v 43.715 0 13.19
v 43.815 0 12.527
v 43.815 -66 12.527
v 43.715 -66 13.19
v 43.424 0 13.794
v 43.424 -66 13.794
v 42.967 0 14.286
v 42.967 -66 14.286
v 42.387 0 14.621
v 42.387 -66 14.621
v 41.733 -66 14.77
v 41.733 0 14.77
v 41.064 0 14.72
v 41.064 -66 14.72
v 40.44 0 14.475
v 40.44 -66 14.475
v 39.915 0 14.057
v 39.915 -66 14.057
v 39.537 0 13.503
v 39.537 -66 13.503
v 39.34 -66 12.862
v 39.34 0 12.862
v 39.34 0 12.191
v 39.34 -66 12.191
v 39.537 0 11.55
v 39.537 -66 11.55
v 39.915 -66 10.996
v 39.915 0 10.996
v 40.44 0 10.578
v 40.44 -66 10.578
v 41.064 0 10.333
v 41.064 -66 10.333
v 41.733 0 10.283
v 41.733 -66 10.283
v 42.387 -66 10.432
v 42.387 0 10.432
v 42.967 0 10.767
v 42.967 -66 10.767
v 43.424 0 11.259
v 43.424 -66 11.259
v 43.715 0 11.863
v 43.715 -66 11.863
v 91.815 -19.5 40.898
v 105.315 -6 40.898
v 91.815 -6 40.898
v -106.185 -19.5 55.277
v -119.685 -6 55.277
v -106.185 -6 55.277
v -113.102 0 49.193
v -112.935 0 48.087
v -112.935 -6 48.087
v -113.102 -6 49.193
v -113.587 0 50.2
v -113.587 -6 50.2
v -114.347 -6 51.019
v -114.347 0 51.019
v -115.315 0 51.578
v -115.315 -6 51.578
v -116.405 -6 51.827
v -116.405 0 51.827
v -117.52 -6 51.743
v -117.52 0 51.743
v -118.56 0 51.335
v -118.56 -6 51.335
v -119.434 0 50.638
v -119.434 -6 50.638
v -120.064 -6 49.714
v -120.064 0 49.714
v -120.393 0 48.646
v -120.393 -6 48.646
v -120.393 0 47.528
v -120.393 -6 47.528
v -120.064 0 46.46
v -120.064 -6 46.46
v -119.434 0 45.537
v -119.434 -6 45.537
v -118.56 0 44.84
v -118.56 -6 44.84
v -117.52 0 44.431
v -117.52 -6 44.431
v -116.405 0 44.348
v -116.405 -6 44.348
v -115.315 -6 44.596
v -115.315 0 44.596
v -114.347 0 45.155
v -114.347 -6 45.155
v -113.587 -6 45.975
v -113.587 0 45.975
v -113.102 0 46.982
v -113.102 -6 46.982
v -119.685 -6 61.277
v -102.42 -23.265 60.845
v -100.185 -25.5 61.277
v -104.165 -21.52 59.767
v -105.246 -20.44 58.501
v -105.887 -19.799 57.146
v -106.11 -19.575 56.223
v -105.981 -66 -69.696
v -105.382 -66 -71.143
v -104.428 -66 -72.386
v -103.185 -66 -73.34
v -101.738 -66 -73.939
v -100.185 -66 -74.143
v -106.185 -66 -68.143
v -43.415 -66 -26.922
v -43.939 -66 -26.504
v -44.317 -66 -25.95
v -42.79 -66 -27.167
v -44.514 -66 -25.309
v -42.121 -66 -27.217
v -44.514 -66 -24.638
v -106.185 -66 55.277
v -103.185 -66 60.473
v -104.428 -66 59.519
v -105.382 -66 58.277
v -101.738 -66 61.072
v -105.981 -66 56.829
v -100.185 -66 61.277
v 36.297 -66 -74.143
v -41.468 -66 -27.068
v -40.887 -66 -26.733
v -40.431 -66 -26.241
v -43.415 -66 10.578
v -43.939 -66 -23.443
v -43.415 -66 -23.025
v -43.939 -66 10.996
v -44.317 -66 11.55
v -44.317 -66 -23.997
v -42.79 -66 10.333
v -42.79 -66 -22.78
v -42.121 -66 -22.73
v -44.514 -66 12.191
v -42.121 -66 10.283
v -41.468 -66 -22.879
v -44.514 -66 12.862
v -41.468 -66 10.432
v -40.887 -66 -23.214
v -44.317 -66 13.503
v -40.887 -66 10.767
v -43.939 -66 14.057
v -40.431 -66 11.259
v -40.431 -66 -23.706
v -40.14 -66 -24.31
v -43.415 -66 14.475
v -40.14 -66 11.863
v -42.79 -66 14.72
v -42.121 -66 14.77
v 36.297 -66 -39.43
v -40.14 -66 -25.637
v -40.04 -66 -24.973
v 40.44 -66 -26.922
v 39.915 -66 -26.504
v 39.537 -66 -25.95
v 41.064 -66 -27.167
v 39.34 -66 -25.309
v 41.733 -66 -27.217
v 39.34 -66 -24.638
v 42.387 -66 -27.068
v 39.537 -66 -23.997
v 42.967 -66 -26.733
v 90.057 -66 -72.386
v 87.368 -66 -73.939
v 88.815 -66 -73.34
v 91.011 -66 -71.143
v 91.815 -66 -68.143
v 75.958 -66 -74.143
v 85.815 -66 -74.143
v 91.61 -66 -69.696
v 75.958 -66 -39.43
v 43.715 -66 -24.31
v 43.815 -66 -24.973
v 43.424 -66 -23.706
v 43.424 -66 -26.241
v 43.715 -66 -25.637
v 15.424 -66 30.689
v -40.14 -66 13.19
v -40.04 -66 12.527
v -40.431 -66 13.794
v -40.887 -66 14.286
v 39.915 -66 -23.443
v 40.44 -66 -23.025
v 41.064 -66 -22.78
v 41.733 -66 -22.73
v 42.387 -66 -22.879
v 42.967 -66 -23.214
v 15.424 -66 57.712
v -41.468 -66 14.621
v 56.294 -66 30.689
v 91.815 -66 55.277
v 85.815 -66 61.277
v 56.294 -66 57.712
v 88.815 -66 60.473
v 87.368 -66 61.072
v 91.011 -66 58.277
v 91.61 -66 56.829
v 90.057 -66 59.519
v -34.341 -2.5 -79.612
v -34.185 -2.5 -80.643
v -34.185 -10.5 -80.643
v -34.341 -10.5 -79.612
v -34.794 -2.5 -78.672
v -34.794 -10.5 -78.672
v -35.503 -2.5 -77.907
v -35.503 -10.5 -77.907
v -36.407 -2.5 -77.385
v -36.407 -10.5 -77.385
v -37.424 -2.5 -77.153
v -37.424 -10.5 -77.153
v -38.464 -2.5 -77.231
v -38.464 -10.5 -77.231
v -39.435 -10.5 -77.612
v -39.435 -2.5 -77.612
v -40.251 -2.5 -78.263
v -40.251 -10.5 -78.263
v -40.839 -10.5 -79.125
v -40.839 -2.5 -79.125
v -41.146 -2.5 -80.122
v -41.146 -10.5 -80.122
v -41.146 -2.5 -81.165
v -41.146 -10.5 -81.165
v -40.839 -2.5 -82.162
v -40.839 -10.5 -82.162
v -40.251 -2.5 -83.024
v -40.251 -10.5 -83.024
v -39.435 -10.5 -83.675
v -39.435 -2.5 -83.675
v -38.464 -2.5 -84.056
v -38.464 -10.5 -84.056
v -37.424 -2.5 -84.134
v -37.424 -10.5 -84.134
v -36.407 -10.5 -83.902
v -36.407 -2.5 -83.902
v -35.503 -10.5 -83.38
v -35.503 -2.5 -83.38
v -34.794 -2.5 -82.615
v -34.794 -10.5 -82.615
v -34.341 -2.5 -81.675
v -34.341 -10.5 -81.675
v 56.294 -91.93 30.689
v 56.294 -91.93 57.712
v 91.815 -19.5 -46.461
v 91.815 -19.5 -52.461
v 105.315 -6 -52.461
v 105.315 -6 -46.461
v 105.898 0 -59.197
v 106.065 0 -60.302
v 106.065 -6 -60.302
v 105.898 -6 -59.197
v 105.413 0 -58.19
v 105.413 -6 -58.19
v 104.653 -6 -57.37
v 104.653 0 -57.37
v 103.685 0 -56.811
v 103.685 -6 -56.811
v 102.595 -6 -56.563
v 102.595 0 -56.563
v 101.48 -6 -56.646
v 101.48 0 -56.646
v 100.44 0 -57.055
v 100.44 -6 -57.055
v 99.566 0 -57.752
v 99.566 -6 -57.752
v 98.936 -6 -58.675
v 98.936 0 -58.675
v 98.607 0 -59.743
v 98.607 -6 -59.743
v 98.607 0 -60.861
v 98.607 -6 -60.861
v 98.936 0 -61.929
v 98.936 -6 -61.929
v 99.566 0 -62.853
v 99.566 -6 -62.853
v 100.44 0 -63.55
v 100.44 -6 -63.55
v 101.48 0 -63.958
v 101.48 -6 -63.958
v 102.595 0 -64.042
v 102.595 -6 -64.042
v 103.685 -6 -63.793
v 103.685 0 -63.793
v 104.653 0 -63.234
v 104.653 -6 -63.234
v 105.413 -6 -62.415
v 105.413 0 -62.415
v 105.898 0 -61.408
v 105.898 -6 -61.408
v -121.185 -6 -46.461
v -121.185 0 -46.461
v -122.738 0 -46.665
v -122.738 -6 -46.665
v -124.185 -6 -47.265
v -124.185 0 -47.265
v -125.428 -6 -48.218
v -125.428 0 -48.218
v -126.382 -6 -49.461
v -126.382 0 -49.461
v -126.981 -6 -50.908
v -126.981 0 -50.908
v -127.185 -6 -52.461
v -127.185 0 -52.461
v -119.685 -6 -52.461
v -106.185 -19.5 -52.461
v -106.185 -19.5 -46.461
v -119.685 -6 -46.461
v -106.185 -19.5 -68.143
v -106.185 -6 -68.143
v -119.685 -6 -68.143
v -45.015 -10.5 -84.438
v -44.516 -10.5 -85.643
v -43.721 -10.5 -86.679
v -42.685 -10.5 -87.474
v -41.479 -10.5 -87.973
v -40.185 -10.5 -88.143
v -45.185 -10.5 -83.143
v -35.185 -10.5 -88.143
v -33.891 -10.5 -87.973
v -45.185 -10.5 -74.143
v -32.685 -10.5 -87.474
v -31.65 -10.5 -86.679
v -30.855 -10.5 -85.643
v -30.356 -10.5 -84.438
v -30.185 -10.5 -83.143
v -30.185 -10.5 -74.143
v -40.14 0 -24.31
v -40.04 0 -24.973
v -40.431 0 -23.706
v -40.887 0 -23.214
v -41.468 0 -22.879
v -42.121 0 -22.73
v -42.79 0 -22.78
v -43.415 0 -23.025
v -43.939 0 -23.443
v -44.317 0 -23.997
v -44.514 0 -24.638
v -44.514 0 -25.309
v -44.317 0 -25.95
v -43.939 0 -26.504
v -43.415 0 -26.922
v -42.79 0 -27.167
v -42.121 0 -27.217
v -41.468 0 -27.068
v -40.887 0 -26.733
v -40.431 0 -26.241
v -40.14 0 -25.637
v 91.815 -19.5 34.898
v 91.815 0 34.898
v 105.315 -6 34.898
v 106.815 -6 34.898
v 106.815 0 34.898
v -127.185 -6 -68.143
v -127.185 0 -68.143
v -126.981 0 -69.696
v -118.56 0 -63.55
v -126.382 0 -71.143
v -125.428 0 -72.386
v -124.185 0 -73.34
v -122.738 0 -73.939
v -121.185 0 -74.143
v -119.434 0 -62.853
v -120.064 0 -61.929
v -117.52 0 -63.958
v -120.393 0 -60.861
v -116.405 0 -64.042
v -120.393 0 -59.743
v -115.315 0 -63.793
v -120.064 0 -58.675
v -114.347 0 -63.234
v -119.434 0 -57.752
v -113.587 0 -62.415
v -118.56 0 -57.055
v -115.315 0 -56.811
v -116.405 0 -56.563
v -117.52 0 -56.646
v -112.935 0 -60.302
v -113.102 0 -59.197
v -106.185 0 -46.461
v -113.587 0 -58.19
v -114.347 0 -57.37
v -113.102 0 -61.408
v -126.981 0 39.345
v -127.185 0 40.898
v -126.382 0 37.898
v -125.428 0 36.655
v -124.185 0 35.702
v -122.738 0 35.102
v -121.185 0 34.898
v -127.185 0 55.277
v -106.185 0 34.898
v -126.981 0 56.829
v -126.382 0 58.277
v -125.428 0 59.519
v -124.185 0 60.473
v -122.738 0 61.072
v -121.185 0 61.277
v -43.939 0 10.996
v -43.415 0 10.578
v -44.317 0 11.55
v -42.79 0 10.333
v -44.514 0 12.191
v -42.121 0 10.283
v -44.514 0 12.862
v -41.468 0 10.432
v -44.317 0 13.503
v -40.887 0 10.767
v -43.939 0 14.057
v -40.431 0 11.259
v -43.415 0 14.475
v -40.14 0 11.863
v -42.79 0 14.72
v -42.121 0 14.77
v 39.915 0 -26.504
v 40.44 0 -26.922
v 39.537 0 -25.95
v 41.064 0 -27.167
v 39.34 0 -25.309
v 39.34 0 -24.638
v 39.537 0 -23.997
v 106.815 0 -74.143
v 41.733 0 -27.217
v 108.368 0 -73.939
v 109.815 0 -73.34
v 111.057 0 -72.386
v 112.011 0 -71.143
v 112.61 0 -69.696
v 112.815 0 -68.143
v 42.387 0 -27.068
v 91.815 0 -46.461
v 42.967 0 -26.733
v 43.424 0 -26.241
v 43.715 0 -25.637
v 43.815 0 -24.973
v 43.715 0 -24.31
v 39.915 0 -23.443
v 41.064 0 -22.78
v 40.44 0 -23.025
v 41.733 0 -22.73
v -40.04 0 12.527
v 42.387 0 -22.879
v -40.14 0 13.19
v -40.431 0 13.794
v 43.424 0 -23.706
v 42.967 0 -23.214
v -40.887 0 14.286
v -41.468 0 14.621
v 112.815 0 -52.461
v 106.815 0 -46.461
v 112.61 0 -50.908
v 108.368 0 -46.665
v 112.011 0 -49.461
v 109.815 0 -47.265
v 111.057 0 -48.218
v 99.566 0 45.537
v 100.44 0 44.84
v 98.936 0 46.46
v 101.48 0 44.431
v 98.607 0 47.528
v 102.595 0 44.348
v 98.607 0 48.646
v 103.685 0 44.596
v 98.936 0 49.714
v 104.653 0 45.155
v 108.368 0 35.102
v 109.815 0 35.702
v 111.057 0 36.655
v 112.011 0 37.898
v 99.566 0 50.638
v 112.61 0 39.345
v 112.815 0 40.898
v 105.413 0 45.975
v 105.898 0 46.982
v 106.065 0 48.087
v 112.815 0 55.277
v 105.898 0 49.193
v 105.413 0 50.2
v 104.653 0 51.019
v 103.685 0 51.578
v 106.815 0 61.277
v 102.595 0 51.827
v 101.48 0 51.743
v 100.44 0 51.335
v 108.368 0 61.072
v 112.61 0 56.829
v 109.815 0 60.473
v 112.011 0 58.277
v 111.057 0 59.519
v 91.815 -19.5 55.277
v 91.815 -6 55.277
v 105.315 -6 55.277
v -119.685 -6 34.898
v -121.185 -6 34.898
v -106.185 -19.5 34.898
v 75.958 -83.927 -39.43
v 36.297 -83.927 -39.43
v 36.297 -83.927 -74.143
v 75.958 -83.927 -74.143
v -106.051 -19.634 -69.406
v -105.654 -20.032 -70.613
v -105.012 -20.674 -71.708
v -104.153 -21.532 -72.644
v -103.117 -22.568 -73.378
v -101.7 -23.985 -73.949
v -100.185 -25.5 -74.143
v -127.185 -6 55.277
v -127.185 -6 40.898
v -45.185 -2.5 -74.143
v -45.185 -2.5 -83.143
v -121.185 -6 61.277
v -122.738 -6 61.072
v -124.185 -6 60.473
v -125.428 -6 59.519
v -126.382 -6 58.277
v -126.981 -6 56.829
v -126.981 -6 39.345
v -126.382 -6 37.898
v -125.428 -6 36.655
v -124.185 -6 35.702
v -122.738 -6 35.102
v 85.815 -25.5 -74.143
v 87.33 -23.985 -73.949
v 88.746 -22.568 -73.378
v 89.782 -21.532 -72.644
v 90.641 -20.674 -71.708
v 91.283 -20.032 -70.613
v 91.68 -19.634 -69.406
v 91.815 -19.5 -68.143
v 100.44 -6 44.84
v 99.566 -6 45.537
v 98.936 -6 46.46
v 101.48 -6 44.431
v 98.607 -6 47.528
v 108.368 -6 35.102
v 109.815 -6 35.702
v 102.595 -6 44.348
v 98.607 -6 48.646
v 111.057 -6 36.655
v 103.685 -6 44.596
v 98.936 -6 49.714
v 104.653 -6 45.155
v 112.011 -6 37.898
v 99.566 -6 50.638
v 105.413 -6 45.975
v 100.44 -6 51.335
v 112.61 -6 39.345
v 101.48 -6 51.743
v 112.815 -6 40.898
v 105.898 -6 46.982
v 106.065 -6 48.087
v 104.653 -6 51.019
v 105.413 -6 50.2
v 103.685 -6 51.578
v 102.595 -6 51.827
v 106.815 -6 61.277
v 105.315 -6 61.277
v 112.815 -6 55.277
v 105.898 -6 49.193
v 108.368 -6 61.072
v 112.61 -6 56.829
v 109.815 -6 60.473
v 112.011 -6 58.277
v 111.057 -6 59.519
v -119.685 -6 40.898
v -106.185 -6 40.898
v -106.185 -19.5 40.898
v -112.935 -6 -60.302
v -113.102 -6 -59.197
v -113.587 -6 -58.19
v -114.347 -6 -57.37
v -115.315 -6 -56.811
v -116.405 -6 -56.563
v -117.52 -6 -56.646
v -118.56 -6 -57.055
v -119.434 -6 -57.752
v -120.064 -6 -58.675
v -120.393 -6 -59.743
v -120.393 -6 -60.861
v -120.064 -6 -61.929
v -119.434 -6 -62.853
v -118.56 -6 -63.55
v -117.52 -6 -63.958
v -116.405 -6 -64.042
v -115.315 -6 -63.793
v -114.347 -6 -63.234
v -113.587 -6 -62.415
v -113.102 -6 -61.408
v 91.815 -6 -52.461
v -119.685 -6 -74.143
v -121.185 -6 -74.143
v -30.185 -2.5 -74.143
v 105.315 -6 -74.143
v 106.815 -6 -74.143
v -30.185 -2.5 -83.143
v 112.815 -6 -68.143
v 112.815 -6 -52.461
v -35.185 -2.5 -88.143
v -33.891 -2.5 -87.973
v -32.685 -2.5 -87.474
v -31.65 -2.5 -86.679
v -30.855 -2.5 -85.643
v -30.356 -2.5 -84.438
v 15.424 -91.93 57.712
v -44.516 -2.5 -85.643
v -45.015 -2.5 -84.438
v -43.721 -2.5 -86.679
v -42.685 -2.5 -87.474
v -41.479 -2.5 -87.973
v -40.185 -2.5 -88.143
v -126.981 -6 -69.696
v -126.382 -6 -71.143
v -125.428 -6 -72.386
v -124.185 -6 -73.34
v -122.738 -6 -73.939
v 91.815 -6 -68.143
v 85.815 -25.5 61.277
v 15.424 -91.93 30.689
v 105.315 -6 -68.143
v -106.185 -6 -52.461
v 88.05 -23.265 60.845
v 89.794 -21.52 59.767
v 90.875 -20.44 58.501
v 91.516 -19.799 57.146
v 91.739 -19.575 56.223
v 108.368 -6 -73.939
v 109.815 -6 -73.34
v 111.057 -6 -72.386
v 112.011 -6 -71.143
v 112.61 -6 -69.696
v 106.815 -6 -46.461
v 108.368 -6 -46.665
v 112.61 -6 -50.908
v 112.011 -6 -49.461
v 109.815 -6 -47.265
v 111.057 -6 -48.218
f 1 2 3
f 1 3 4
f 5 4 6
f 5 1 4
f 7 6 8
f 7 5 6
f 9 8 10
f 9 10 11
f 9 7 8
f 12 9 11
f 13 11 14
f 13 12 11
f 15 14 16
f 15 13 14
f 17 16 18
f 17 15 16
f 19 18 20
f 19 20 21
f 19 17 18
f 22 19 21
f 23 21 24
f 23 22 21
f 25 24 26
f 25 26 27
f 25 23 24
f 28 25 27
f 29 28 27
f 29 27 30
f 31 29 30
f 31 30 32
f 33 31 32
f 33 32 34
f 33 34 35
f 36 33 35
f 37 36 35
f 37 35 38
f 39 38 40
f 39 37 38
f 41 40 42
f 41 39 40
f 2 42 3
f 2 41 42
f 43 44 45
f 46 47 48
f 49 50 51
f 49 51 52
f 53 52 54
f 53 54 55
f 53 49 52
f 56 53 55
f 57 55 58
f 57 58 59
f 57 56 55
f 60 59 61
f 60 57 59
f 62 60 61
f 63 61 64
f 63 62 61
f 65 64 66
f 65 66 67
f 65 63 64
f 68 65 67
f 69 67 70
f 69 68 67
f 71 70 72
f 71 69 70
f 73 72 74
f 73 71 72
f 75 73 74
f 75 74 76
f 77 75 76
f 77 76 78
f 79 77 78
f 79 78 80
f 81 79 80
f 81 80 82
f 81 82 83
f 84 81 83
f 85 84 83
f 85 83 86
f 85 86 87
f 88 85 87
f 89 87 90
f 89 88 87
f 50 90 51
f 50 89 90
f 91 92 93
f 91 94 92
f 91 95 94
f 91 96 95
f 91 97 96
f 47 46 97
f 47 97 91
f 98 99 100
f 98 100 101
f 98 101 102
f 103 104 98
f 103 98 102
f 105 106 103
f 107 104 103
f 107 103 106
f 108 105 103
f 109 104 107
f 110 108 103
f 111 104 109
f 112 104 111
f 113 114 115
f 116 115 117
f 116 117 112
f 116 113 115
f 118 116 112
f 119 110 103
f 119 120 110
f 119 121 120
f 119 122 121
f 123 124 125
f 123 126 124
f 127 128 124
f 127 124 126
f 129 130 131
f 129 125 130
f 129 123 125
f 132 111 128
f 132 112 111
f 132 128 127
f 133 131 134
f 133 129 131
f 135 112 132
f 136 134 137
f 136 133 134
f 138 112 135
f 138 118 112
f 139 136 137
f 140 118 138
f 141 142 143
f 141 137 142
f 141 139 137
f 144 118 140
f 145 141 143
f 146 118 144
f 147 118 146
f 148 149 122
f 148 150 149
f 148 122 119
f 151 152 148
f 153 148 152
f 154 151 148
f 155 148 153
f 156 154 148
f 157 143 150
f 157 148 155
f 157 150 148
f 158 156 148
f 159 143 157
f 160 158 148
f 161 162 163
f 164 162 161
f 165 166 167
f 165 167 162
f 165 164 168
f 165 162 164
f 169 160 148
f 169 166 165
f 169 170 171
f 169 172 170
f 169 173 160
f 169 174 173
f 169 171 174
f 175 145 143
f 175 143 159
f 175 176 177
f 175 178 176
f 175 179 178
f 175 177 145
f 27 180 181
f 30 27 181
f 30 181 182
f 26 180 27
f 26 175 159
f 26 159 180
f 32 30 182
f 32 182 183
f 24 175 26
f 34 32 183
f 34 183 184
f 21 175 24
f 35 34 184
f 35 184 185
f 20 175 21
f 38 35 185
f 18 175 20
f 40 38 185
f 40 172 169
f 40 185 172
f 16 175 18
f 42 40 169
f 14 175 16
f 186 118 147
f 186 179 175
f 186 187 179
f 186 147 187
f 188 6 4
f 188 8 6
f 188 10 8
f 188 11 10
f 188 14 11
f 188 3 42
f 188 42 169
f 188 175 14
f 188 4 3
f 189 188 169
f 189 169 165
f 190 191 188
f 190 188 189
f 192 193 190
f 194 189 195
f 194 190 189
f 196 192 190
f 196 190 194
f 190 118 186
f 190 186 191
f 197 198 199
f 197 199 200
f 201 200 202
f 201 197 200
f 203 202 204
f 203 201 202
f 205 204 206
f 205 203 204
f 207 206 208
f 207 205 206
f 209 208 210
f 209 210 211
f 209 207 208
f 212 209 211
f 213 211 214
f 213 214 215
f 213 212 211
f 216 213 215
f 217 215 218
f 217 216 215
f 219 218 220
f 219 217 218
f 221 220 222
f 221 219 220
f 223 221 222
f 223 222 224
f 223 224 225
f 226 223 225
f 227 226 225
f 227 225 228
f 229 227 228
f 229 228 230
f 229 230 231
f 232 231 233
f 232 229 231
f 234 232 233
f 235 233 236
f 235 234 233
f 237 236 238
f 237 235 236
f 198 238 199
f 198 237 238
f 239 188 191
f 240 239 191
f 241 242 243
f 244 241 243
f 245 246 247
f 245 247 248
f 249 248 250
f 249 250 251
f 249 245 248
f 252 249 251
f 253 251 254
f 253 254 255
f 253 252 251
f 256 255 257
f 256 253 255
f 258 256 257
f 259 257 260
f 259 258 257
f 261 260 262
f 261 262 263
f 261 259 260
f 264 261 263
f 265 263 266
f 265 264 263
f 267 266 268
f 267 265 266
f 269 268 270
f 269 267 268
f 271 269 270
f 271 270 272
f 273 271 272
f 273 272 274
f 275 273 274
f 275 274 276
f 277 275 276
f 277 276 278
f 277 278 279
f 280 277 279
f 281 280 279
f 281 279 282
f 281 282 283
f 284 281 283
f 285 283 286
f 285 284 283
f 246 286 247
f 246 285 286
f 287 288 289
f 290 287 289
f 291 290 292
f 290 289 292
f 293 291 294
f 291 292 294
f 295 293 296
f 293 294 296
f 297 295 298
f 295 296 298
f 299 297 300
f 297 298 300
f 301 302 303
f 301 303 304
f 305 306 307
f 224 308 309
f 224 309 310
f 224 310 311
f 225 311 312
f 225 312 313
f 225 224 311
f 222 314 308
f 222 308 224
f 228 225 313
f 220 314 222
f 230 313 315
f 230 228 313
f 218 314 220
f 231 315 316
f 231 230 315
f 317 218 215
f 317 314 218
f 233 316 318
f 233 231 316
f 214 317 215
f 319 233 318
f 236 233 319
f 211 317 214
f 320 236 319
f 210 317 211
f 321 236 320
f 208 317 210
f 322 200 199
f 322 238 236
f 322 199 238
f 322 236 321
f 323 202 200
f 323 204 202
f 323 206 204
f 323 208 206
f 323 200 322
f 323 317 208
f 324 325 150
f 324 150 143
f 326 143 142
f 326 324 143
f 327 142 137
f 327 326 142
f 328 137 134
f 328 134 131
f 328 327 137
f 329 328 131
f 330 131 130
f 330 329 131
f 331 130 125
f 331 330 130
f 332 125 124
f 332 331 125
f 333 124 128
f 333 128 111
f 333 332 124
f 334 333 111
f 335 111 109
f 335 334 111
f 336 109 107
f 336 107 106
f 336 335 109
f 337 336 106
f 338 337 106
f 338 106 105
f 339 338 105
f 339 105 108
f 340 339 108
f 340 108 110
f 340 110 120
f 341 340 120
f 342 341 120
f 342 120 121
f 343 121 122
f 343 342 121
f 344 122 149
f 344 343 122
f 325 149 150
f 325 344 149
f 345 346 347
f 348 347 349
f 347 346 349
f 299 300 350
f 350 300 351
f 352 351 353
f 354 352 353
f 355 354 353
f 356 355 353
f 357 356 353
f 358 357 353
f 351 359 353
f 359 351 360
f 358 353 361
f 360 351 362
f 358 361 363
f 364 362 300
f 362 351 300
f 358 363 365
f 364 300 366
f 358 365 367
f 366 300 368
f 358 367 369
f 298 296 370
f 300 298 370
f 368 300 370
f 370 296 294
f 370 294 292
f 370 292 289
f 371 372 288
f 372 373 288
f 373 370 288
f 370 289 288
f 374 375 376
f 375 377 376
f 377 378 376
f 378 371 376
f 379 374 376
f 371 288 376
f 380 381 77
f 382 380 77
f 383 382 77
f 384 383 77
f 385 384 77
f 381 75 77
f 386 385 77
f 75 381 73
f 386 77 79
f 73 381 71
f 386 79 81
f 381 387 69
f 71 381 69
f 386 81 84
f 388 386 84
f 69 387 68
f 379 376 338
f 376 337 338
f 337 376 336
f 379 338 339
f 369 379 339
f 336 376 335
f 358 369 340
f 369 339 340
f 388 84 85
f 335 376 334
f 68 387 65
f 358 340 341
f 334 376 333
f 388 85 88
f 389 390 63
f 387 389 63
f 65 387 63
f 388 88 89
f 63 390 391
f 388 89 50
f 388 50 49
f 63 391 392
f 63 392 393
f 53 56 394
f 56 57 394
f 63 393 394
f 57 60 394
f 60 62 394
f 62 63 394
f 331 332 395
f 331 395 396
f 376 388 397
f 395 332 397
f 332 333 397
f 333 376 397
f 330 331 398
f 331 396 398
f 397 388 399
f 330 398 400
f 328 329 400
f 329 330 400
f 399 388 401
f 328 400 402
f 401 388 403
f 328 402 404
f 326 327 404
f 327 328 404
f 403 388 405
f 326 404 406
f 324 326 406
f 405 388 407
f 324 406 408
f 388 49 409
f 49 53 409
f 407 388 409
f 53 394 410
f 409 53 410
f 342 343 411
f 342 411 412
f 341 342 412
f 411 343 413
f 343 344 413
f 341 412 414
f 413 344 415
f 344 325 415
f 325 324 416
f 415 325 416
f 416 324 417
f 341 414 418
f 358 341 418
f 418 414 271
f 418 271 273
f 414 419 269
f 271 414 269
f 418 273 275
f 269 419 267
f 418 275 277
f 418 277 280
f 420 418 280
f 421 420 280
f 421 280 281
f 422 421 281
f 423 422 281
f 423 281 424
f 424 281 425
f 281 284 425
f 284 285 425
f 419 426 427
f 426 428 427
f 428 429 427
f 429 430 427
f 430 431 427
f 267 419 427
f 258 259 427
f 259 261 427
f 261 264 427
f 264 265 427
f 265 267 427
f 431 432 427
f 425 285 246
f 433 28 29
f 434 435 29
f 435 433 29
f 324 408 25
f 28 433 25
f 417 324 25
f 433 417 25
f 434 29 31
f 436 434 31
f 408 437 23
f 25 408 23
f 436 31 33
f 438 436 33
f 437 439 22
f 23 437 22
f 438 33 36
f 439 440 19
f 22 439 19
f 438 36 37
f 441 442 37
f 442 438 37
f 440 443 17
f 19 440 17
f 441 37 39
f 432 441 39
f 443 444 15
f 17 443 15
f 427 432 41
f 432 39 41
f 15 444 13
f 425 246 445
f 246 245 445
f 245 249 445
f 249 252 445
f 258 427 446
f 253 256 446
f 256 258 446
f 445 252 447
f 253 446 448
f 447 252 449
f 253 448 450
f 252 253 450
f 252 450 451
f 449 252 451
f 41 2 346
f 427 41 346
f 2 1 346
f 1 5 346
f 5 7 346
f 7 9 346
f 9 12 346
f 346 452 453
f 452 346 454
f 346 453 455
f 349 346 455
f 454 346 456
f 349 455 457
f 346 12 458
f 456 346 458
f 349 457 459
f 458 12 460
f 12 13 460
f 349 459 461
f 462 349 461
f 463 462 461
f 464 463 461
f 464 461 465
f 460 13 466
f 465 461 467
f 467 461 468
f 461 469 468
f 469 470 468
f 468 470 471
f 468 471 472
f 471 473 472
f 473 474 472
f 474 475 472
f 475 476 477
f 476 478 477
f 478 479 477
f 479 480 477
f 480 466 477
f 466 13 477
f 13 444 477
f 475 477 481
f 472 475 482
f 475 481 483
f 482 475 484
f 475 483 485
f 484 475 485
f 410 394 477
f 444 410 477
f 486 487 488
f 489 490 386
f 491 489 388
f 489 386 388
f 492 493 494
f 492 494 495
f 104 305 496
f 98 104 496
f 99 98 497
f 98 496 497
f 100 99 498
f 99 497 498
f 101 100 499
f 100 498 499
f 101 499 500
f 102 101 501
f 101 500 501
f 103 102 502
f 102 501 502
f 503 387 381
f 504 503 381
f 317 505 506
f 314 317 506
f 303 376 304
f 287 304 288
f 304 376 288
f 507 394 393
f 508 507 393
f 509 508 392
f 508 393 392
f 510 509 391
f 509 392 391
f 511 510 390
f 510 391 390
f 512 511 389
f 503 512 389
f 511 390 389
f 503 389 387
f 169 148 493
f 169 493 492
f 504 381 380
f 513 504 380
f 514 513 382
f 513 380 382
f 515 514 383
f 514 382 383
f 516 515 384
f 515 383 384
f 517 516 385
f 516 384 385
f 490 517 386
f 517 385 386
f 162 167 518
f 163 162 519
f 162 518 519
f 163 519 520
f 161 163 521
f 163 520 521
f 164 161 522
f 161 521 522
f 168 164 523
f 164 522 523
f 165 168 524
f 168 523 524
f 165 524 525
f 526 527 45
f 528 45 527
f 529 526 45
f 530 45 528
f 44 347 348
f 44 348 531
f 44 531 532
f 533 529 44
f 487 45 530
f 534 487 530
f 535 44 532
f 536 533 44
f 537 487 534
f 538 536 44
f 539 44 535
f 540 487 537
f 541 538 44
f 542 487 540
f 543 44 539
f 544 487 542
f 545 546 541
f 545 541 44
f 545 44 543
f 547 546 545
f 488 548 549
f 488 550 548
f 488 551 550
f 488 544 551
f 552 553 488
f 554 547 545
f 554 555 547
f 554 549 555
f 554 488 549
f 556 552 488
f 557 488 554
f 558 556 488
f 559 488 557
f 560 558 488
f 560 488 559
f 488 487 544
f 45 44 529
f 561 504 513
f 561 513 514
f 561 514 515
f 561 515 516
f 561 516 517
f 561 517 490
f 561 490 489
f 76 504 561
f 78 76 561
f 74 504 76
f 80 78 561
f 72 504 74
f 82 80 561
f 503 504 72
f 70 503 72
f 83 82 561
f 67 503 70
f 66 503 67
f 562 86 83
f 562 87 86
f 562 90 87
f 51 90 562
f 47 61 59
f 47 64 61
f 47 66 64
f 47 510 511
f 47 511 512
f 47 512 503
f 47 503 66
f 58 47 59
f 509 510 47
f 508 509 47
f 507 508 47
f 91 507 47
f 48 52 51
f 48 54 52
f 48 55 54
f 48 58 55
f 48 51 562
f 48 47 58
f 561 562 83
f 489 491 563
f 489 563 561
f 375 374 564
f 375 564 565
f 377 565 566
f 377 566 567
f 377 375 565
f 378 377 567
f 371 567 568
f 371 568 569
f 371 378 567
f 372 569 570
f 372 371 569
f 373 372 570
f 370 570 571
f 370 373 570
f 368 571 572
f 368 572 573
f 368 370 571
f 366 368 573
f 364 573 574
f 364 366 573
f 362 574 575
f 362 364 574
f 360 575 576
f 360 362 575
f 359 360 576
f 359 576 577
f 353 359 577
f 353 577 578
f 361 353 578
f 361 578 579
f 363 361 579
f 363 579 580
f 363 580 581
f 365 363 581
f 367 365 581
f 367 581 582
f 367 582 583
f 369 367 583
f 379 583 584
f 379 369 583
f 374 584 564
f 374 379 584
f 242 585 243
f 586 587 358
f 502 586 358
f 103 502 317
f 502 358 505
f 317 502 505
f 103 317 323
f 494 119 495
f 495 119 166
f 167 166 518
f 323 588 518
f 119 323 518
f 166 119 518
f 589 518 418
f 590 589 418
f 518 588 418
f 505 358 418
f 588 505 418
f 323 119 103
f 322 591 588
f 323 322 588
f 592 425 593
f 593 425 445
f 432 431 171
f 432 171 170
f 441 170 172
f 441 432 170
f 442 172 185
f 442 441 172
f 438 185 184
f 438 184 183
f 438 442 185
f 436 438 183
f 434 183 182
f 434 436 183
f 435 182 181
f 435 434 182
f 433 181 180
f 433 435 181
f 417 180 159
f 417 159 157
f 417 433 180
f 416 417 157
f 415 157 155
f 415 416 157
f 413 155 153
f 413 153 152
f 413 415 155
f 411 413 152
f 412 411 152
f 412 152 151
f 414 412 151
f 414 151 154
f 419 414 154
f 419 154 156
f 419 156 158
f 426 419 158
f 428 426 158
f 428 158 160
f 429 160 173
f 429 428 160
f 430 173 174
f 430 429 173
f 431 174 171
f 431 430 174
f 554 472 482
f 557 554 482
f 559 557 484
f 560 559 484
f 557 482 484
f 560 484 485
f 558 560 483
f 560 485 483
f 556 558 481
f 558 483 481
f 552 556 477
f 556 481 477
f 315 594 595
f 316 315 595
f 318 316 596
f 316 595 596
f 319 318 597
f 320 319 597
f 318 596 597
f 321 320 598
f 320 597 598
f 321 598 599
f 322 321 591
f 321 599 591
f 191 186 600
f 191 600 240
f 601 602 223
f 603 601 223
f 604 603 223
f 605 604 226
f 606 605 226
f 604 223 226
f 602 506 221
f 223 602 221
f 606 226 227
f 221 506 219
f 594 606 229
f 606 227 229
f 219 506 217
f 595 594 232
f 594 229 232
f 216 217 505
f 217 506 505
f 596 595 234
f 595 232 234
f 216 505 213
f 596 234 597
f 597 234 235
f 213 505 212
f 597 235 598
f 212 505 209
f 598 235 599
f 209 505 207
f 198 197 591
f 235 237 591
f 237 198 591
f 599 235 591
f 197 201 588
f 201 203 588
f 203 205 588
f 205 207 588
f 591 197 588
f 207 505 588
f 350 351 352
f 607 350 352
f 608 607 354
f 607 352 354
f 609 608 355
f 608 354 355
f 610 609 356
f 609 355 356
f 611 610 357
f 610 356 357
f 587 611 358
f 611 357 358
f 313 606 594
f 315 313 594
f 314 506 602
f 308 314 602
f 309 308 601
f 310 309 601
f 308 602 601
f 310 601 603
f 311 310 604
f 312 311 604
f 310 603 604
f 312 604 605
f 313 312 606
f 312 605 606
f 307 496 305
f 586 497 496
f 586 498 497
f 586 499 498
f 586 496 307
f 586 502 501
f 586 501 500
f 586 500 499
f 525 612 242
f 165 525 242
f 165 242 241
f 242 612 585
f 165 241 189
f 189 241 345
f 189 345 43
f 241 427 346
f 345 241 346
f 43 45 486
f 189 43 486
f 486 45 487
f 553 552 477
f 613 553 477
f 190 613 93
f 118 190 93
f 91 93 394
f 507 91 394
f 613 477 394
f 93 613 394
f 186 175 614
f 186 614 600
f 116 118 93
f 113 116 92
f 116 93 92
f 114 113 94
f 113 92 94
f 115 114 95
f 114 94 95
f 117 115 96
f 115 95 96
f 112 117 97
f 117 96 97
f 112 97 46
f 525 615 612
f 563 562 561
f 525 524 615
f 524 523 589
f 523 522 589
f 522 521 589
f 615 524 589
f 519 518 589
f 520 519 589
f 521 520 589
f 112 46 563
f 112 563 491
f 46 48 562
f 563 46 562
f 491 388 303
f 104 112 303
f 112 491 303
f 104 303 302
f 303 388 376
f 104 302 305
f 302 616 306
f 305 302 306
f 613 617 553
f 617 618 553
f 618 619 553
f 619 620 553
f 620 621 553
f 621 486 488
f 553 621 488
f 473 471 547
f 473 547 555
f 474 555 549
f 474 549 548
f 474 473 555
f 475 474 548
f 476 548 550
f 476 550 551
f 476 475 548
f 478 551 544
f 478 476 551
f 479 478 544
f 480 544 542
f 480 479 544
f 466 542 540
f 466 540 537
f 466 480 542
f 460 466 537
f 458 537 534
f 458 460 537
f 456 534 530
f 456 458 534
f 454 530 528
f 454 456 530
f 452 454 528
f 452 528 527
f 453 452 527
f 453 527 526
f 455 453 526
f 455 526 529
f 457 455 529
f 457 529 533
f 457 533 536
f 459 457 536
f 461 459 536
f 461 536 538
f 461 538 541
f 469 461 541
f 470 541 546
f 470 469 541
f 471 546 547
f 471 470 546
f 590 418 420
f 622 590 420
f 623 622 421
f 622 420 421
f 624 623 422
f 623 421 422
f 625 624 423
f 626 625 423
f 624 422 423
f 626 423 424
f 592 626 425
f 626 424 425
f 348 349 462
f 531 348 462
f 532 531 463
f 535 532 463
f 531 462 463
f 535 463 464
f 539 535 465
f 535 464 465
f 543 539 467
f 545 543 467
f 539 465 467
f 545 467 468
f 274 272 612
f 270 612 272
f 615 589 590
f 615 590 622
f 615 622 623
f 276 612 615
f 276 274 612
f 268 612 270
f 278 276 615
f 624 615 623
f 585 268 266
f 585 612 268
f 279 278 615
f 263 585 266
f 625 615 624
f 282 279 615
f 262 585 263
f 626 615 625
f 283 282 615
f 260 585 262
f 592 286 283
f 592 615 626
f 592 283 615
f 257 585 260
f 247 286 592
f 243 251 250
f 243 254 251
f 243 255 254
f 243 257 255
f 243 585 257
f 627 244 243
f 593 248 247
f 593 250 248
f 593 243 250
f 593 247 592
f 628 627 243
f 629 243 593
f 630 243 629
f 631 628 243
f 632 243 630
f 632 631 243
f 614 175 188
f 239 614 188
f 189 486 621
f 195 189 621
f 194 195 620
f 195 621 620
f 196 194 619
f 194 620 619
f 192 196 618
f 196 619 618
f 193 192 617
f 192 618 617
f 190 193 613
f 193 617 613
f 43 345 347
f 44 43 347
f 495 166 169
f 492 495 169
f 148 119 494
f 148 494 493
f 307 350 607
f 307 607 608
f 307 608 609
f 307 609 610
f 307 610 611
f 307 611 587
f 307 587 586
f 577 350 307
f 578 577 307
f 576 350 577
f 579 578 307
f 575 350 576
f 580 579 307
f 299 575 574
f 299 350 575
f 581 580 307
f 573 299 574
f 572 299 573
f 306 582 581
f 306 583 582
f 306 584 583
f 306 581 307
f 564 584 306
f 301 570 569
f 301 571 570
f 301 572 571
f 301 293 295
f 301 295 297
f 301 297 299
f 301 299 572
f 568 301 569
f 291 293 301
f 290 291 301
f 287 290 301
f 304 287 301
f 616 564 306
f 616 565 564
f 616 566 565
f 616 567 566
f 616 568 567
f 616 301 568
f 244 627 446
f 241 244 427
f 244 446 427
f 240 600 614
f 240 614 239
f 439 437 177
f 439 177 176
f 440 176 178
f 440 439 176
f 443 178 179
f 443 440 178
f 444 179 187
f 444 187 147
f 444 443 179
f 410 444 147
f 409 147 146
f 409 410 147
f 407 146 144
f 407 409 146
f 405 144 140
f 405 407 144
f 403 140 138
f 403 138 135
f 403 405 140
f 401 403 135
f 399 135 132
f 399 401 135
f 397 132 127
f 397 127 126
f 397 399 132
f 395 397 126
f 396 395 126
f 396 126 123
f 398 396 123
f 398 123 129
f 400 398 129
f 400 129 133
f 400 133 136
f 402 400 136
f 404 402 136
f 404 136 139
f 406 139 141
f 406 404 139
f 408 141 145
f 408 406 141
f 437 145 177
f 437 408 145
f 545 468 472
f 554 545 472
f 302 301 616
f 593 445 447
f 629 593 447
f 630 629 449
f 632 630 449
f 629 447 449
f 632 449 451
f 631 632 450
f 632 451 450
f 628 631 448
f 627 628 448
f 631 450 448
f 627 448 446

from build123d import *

# Parameters (mm, degrees)
F0_R      = 2.25
F1_DEPTH  = 66
F0_R_2    = 3.75
F2_DEPTH  = 6
F5_W      = 40.8705817536
F5_H      = 27.0229801536
F6_DEPTH  = 25.93
F5_W_2    = 39.6605432034
F5_H_2    = 34.7132187133
F7_DEPTH  = 17.926812
F8_REACH  = 45.9022057631
F9_REACH  = 45.9022057631
F10_START = 2.5
F0_R_3    = 3.5
F10_DEPTH = 8


with BuildPart() as f1:
    # F0 (on Front) → F1 (new body)
    with BuildSketch(Plane.XZ):
        with BuildLine():
            Line((85.8146208827, 61.2765278835), (-100.1853791173, 61.2765278835))
            ThreePointArc((-100.1853791173, 61.2765278835), (-104.4280198044, 59.5191685706), (-106.1853791173, 55.2765278835))
            Line((-106.1853791173, 55.2765278835), (-106.1853791173, 40.8978178835))
            Line((-106.1853791173, 40.8978178835), (-106.1853791173, 34.8978178835))
            Line((-106.1853791173, 34.8978178835), (-106.1853791173, -46.4609452256))
            Line((-106.1853791173, -46.4609452256), (-106.1853791173, -52.4609452256))
            Line((-106.1853791173, -52.4609452256), (-106.1853791173, -68.1434721165))
            ThreePointArc((-106.1853791173, -68.1434721165), (-104.4280198044, -72.3861128036), (-100.1853791173, -74.1434721165))
            Line((-100.1853791173, -74.1434721165), (-45.1853791173, -74.1434721165))
            Line((-45.1853791173, -74.1434721165), (-30.1853791173, -74.1434721165))
            Line((-30.1853791173, -74.1434721165), (85.8146208827, -74.1434721165))
            ThreePointArc((85.8146208827, -74.1434721165), (90.0572615698, -72.3861128036), (91.8146208827, -68.1434721165))
            Line((91.8146208827, -68.1434721165), (91.8146208827, -52.4609452256))
            Line((91.8146208827, -52.4609452256), (91.8146208827, -46.4609452256))
            Line((91.8146208827, -46.4609452256), (91.8146208827, 34.8978178835))
            Line((91.8146208827, 34.8978178835), (91.8146208827, 40.8978178835))
            Line((91.8146208827, 40.8978178835), (91.8146208827, 55.2765278835))
            ThreePointArc((91.8146208827, 55.2765278835), (90.0572615698, 59.5191685706), (85.8146208827, 61.2765278835))
        make_face()
        with Locations((-42.2896091173, -24.9734721165)):
            Circle(F0_R, mode=Mode.SUBTRACT)
        with Locations((41.5646208827, -24.9734721165)):
            Circle(F0_R, mode=Mode.SUBTRACT)
        with Locations((-42.2896091173, 12.5265278835)):
            Circle(F0_R, mode=Mode.SUBTRACT)
        with Locations((41.5646208827, 12.5265278835)):
            Circle(F0_R, mode=Mode.SUBTRACT)
    extrude(amount=F1_DEPTH)

    # F0 (on Front) → F2 (join)
    with BuildSketch(Plane.XZ):
        with BuildLine():
            Line((-106.1853791173, 40.8978178835), (-106.1853791173, 55.2765278835))
            Line((-106.1853791173, 55.2765278835), (-119.6853791173, 55.2765278835))
            Line((-119.6853791173, 55.2765278835), (-119.6853791173, 61.2765278835))
            Line((-119.6853791173, 61.2765278835), (-121.1853791173, 61.2765278835))
            ThreePointArc((-121.1853791173, 61.2765278835), (-125.4280198044, 59.5191685706), (-127.1853791173, 55.2765278835))
            Line((-127.1853791173, 55.2765278835), (-127.1853791173, 40.8978178835))
            ThreePointArc((-127.1853791173, 40.8978178835), (-125.4280198044, 36.6551771964), (-121.1853791173, 34.8978178835))
            Line((-121.1853791173, 34.8978178835), (-119.6853791173, 34.8978178835))
            Line((-119.6853791173, 34.8978178835), (-119.6853791173, 40.8978178835))
            Line((-119.6853791173, 40.8978178835), (-106.1853791173, 40.8978178835))
        make_face()
        with Locations((-116.6853791173, 48.0871728835)):
            Circle(F0_R_2, mode=Mode.SUBTRACT)
        with BuildLine():
            Line((106.8146208827, 61.2765278835), (105.3146208827, 61.2765278835))
            Line((105.3146208827, 61.2765278835), (105.3146208827, 55.2765278835))
            Line((105.3146208827, 55.2765278835), (91.8146208827, 55.2765278835))
            Line((91.8146208827, 55.2765278835), (91.8146208827, 40.8978178835))
            Line((91.8146208827, 40.8978178835), (105.3146208827, 40.8978178835))
            Line((105.3146208827, 40.8978178835), (105.3146208827, 34.8978178835))
            Line((105.3146208827, 34.8978178835), (106.8146208827, 34.8978178835))
            ThreePointArc((106.8146208827, 34.8978178835), (111.0572615698, 36.6551771964), (112.8146208827, 40.8978178835))
            Line((112.8146208827, 40.8978178835), (112.8146208827, 55.2765278835))
            ThreePointArc((112.8146208827, 55.2765278835), (111.0572615698, 59.5191685706), (106.8146208827, 61.2765278835))
        make_face()
        with Locations((102.3146208827, 48.0871728835)):
            Circle(F0_R_2, mode=Mode.SUBTRACT)
        with BuildLine():
            Line((105.3146208827, -52.4609452256), (91.8146208827, -52.4609452256))
            Line((91.8146208827, -52.4609452256), (91.8146208827, -68.1434721165))
            Line((91.8146208827, -68.1434721165), (105.3146208827, -68.1434721165))
            Line((105.3146208827, -68.1434721165), (105.3146208827, -74.1434721165))
            Line((105.3146208827, -74.1434721165), (106.8146208827, -74.1434721165))
            ThreePointArc((106.8146208827, -74.1434721165), (111.0572615698, -72.3861128036), (112.8146208827, -68.1434721165))
            Line((112.8146208827, -68.1434721165), (112.8146208827, -52.4609452256))
            ThreePointArc((112.8146208827, -52.4609452256), (111.0572615698, -48.2183045385), (106.8146208827, -46.4609452256))
            Line((106.8146208827, -46.4609452256), (105.3146208827, -46.4609452256))
            Line((105.3146208827, -46.4609452256), (105.3146208827, -52.4609452256))
        make_face()
        with Locations((102.3146208827, -60.302208671)):
            Circle(F0_R_2, mode=Mode.SUBTRACT)
        with BuildLine():
            Line((-106.1853791173, -68.1434721165), (-106.1853791173, -52.4609452256))
            Line((-106.1853791173, -52.4609452256), (-119.6853791173, -52.4609452256))
            Line((-119.6853791173, -52.4609452256), (-119.6853791173, -46.4609452256))
            Line((-119.6853791173, -46.4609452256), (-121.1853791173, -46.4609452256))
            ThreePointArc((-121.1853791173, -46.4609452256), (-125.4280198044, -48.2183045385), (-127.1853791173, -52.4609452256))
            Line((-127.1853791173, -52.4609452256), (-127.1853791173, -68.1434721165))
            ThreePointArc((-127.1853791173, -68.1434721165), (-125.4280198044, -72.3861128036), (-121.1853791173, -74.1434721165))
            Line((-121.1853791173, -74.1434721165), (-119.6853791173, -74.1434721165))
            Line((-119.6853791173, -74.1434721165), (-119.6853791173, -68.1434721165))
            Line((-119.6853791173, -68.1434721165), (-106.1853791173, -68.1434721165))
        make_face()
        with Locations((-116.6853791173, -60.302208671)):
            Circle(F0_R_2, mode=Mode.SUBTRACT)
        with BuildLine():
            ThreePointArc((-106.1853791173, 55.2765278835), (-104.4280198044, 59.5191685706), (-100.1853791173, 61.2765278835))
            Line((-100.1853791173, 61.2765278835), (-106.1853791173, 61.2765278835))
            Line((-106.1853791173, 61.2765278835), (-119.6853791173, 61.2765278835))
            Line((-119.6853791173, 61.2765278835), (-119.6853791173, 55.2765278835))
            Line((-119.6853791173, 55.2765278835), (-106.1853791173, 55.2765278835))
        make_face()
        Polygon((-106.1853791173, 34.8978178835), (-106.1853791173, 40.8978178835), (-119.6853791173, 40.8978178835), (-119.6853791173, 34.8978178835), (-112.1853791173, 34.8978178835), align=None)
        Polygon((-106.1853791173, -52.4609452256), (-106.1853791173, -46.4609452256), (-112.1853791173, -46.4609452256), (-119.6853791173, -46.4609452256), (-119.6853791173, -52.4609452256), align=None)
        with BuildLine():
            ThreePointArc((-100.1853791173, -74.1434721165), (-104.4280198044, -72.3861128036), (-106.1853791173, -68.1434721165))
            Line((-106.1853791173, -68.1434721165), (-119.6853791173, -68.1434721165))
            Line((-119.6853791173, -68.1434721165), (-119.6853791173, -74.1434721165))
            Line((-119.6853791173, -74.1434721165), (-100.1853791173, -74.1434721165))
        make_face()
        with BuildLine():
            Line((105.3146208827, -68.1434721165), (91.8146208827, -68.1434721165))
            ThreePointArc((91.8146208827, -68.1434721165), (90.0572615698, -72.3861128036), (85.8146208827, -74.1434721165))
            Line((85.8146208827, -74.1434721165), (105.3146208827, -74.1434721165))
            Line((105.3146208827, -74.1434721165), (105.3146208827, -68.1434721165))
        make_face()
        Polygon((97.8146208827, -46.4609452256), (91.8146208827, -46.4609452256), (91.8146208827, -52.4609452256), (105.3146208827, -52.4609452256), (105.3146208827, -46.4609452256), align=None)
        Polygon((105.3146208827, 40.8978178835), (91.8146208827, 40.8978178835), (91.8146208827, 34.8978178835), (97.8146208827, 34.8978178835), (105.3146208827, 34.8978178835), align=None)
        with BuildLine():
            Line((105.3146208827, 61.2765278835), (85.8146208827, 61.2765278835))
            ThreePointArc((85.8146208827, 61.2765278835), (90.0572615698, 59.5191685706), (91.8146208827, 55.2765278835))
            Line((91.8146208827, 55.2765278835), (105.3146208827, 55.2765278835))
            Line((105.3146208827, 55.2765278835), (105.3146208827, 61.2765278835))
        make_face()
    extrude(amount=F2_DEPTH)

    # F5 (on face) → F6 (join)
    with BuildSketch(Plane.XZ.offset(66)):
        with Locations((35.8588262461, 44.2000478506)):
            Rectangle(F5_W, F5_H)
    extrude(amount=F6_DEPTH)

    # F5 (on face) → F7 (join)
    with BuildSketch(Plane.XZ.offset(66)):
        with Locations((56.1274141073, -56.7868627598)):
            Rectangle(F5_W_2, F5_H_2)
    extrude(amount=F7_DEPTH)

    f8_end = Plane(origin=(-109.9353791173, -15.75, -4.1434721165), x_dir=(-0.7071067812, 0.7071067812, 0), z_dir=(-0.7071067812, -0.7071067812, 0))
    # F0 (on Front) → F8 (join, up to a plane its end follows)
    with BuildSketch(Plane.XZ):
        with BuildLine():
            ThreePointArc((-106.1853791173, 55.2765278835), (-104.4280198044, 59.5191685706), (-100.1853791173, 61.2765278835))
            Line((-100.1853791173, 61.2765278835), (-106.1853791173, 61.2765278835))
            Line((-106.1853791173, 61.2765278835), (-119.6853791173, 61.2765278835))
            Line((-119.6853791173, 61.2765278835), (-119.6853791173, 55.2765278835))
            Line((-119.6853791173, 55.2765278835), (-106.1853791173, 55.2765278835))
        make_face()
        Polygon((-106.1853791173, 34.8978178835), (-106.1853791173, 40.8978178835), (-119.6853791173, 40.8978178835), (-119.6853791173, 34.8978178835), (-112.1853791173, 34.8978178835), align=None)
        Polygon((-106.1853791173, -52.4609452256), (-106.1853791173, -46.4609452256), (-112.1853791173, -46.4609452256), (-119.6853791173, -46.4609452256), (-119.6853791173, -52.4609452256), align=None)
        with BuildLine():
            ThreePointArc((-100.1853791173, -74.1434721165), (-104.4280198044, -72.3861128036), (-106.1853791173, -68.1434721165))
            Line((-106.1853791173, -68.1434721165), (-119.6853791173, -68.1434721165))
            Line((-119.6853791173, -68.1434721165), (-119.6853791173, -74.1434721165))
            Line((-119.6853791173, -74.1434721165), (-100.1853791173, -74.1434721165))
        make_face()
    f8_long = extrude(amount=F8_REACH, mode=Mode.PRIVATE)
    add(split(f8_long, bisect_by=f8_end, keep=Keep.BOTTOM, mode=Mode.PRIVATE))

    f9_end = Plane(origin=(95.5646208827, -15.75, -4.1434721165), x_dir=(0.7071067812, 0.7071067812, 0), z_dir=(-0.7071067812, 0.7071067812, 0))
    # F0 (on Front) → F9 (join, up to a plane its end follows)
    with BuildSketch(Plane.XZ):
        with BuildLine():
            Line((105.3146208827, 61.2765278835), (85.8146208827, 61.2765278835))
            ThreePointArc((85.8146208827, 61.2765278835), (90.0572615698, 59.5191685706), (91.8146208827, 55.2765278835))
            Line((91.8146208827, 55.2765278835), (105.3146208827, 55.2765278835))
            Line((105.3146208827, 55.2765278835), (105.3146208827, 61.2765278835))
        make_face()
        Polygon((105.3146208827, 40.8978178835), (91.8146208827, 40.8978178835), (91.8146208827, 34.8978178835), (97.8146208827, 34.8978178835), (105.3146208827, 34.8978178835), align=None)
        Polygon((97.8146208827, -46.4609452256), (91.8146208827, -46.4609452256), (91.8146208827, -52.4609452256), (105.3146208827, -52.4609452256), (105.3146208827, -46.4609452256), align=None)
        with BuildLine():
            Line((105.3146208827, -68.1434721165), (91.8146208827, -68.1434721165))
            ThreePointArc((91.8146208827, -68.1434721165), (90.0572615698, -72.3861128036), (85.8146208827, -74.1434721165))
            Line((85.8146208827, -74.1434721165), (105.3146208827, -74.1434721165))
            Line((105.3146208827, -74.1434721165), (105.3146208827, -68.1434721165))
        make_face()
    f9_long = extrude(amount=F9_REACH, mode=Mode.PRIVATE)
    add(split(f9_long, bisect_by=f9_end, keep=Keep.TOP, mode=Mode.PRIVATE))

    # F0 (on Front) → F10 (join)
    with BuildSketch(Plane.XZ.offset(F10_START)):
        with BuildLine():
            Line((-30.1853791173, -74.1434721165), (-45.1853791173, -74.1434721165))
            Line((-45.1853791173, -74.1434721165), (-45.1853791173, -83.1434721165))
            ThreePointArc((-45.1853791173, -83.1434721165), (-43.7209130232, -86.6790060224), (-40.1853791173, -88.1434721165))
            Line((-40.1853791173, -88.1434721165), (-35.1853791173, -88.1434721165))
            ThreePointArc((-35.1853791173, -88.1434721165), (-31.6498452114, -86.6790060224), (-30.1853791173, -83.1434721165))
            Line((-30.1853791173, -83.1434721165), (-30.1853791173, -74.1434721165))
        make_face()
        with Locations((-37.6853791173, -80.6434721165)):
            Circle(F0_R_3, mode=Mode.SUBTRACT)
    extrude(amount=F10_DEPTH)


solid = f1.part
